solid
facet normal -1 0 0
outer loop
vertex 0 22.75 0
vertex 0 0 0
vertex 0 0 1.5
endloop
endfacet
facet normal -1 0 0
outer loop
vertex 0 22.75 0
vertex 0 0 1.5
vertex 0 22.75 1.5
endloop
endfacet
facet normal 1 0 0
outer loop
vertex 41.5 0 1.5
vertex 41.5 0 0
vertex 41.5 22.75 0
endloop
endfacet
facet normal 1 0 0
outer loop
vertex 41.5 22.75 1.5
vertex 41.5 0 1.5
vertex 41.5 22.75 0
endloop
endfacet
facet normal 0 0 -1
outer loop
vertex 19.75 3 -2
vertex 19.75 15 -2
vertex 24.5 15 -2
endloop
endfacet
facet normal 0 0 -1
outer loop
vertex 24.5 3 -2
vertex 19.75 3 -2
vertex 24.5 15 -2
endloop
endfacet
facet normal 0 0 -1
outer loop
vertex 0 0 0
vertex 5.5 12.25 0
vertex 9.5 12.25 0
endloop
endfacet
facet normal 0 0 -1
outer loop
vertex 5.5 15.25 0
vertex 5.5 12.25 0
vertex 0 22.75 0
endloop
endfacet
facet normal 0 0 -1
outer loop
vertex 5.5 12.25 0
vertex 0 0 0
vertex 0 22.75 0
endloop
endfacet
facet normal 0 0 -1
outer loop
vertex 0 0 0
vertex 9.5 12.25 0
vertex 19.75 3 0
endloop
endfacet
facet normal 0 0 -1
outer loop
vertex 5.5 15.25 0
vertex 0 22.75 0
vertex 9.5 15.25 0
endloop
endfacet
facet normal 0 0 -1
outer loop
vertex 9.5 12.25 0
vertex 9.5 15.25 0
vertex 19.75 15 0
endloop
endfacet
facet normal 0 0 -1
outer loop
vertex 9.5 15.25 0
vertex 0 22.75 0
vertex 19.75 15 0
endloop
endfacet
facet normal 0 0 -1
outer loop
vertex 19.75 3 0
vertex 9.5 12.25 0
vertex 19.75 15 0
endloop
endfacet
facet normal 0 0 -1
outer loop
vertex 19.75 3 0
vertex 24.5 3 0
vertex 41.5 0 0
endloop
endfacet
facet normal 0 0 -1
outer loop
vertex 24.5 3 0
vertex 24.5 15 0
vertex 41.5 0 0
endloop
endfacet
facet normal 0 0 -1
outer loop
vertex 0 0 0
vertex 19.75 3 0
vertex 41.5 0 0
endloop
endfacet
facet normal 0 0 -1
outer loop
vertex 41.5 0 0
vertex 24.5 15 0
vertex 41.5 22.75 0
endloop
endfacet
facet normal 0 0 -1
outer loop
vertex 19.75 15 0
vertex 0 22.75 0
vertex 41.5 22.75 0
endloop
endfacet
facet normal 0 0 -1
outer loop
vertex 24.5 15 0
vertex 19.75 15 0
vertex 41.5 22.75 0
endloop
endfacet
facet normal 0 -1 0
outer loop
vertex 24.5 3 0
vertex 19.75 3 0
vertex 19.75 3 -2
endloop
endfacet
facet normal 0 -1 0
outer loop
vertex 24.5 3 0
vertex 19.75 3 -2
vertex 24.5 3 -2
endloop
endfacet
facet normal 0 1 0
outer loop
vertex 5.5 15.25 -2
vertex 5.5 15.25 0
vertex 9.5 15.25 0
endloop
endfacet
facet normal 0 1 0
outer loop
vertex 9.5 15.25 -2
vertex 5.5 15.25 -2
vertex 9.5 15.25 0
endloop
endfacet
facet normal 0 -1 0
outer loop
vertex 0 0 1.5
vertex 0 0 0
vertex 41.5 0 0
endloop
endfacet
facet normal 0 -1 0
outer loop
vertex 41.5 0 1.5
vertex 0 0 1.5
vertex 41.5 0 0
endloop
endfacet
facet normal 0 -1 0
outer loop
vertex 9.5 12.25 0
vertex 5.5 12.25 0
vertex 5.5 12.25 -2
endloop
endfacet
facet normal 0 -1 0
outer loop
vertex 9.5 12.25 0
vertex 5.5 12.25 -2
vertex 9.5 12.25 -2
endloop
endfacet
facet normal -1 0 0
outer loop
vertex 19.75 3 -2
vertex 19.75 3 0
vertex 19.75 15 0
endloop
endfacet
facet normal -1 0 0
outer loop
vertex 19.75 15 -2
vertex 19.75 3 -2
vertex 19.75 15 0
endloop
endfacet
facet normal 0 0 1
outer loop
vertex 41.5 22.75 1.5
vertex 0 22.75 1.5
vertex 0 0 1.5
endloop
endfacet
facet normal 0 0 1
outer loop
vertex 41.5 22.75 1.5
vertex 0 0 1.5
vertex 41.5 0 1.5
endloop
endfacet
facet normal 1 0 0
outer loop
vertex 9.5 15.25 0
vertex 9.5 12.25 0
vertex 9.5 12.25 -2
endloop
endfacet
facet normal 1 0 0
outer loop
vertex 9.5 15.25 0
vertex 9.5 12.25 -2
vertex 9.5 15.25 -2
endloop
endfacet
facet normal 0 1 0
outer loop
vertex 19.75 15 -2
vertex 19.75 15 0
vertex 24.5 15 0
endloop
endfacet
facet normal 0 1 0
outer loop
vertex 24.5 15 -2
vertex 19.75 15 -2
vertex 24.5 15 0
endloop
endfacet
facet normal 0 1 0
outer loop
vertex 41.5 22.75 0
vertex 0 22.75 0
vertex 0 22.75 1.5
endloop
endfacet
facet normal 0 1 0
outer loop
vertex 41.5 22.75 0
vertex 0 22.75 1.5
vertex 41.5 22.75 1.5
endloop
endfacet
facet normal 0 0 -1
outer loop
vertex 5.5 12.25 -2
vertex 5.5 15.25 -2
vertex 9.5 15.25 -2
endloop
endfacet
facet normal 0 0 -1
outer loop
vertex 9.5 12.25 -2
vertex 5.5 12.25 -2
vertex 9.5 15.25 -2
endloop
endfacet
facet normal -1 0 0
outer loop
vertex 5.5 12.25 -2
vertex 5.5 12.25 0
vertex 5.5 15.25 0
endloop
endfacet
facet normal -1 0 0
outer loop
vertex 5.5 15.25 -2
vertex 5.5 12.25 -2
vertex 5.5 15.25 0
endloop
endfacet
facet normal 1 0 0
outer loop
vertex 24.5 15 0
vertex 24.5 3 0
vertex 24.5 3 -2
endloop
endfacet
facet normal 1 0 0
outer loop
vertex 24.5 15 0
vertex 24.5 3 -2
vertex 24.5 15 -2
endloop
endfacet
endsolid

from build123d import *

# Parameters (mm, degrees)
SKETCH1_W           = 41.5
SKETCH1_H           = 22.75
BOSS_EXTRUDE1_DEPTH = 1.5
SKETCH1_3_W         = 4
SKETCH1_3_H         = 3
SKETCH1_3_W_2       = 4.75
SKETCH1_3_H_2       = 12
BOSS_EXTRUDE2_DEPTH = 2


with BuildPart() as part:
    # Sketch1 → Boss-Extrude1 (new body)
    with BuildSketch(Plane.XY):
        with Locations((20.75, 11.375)):
            Rectangle(SKETCH1_W, SKETCH1_H)
    extrude(amount=BOSS_EXTRUDE1_DEPTH)

    # Sketch1<3> → Boss-Extrude2 (add)
    with BuildSketch(Plane.XY):
        with Locations((7.5, 13.75)):
            Rectangle(SKETCH1_3_W, SKETCH1_3_H)
        with Locations((22.125, 9)):
            Rectangle(SKETCH1_3_W_2, SKETCH1_3_H_2)
    extrude(amount=-BOSS_EXTRUDE2_DEPTH)


solid = part.part
